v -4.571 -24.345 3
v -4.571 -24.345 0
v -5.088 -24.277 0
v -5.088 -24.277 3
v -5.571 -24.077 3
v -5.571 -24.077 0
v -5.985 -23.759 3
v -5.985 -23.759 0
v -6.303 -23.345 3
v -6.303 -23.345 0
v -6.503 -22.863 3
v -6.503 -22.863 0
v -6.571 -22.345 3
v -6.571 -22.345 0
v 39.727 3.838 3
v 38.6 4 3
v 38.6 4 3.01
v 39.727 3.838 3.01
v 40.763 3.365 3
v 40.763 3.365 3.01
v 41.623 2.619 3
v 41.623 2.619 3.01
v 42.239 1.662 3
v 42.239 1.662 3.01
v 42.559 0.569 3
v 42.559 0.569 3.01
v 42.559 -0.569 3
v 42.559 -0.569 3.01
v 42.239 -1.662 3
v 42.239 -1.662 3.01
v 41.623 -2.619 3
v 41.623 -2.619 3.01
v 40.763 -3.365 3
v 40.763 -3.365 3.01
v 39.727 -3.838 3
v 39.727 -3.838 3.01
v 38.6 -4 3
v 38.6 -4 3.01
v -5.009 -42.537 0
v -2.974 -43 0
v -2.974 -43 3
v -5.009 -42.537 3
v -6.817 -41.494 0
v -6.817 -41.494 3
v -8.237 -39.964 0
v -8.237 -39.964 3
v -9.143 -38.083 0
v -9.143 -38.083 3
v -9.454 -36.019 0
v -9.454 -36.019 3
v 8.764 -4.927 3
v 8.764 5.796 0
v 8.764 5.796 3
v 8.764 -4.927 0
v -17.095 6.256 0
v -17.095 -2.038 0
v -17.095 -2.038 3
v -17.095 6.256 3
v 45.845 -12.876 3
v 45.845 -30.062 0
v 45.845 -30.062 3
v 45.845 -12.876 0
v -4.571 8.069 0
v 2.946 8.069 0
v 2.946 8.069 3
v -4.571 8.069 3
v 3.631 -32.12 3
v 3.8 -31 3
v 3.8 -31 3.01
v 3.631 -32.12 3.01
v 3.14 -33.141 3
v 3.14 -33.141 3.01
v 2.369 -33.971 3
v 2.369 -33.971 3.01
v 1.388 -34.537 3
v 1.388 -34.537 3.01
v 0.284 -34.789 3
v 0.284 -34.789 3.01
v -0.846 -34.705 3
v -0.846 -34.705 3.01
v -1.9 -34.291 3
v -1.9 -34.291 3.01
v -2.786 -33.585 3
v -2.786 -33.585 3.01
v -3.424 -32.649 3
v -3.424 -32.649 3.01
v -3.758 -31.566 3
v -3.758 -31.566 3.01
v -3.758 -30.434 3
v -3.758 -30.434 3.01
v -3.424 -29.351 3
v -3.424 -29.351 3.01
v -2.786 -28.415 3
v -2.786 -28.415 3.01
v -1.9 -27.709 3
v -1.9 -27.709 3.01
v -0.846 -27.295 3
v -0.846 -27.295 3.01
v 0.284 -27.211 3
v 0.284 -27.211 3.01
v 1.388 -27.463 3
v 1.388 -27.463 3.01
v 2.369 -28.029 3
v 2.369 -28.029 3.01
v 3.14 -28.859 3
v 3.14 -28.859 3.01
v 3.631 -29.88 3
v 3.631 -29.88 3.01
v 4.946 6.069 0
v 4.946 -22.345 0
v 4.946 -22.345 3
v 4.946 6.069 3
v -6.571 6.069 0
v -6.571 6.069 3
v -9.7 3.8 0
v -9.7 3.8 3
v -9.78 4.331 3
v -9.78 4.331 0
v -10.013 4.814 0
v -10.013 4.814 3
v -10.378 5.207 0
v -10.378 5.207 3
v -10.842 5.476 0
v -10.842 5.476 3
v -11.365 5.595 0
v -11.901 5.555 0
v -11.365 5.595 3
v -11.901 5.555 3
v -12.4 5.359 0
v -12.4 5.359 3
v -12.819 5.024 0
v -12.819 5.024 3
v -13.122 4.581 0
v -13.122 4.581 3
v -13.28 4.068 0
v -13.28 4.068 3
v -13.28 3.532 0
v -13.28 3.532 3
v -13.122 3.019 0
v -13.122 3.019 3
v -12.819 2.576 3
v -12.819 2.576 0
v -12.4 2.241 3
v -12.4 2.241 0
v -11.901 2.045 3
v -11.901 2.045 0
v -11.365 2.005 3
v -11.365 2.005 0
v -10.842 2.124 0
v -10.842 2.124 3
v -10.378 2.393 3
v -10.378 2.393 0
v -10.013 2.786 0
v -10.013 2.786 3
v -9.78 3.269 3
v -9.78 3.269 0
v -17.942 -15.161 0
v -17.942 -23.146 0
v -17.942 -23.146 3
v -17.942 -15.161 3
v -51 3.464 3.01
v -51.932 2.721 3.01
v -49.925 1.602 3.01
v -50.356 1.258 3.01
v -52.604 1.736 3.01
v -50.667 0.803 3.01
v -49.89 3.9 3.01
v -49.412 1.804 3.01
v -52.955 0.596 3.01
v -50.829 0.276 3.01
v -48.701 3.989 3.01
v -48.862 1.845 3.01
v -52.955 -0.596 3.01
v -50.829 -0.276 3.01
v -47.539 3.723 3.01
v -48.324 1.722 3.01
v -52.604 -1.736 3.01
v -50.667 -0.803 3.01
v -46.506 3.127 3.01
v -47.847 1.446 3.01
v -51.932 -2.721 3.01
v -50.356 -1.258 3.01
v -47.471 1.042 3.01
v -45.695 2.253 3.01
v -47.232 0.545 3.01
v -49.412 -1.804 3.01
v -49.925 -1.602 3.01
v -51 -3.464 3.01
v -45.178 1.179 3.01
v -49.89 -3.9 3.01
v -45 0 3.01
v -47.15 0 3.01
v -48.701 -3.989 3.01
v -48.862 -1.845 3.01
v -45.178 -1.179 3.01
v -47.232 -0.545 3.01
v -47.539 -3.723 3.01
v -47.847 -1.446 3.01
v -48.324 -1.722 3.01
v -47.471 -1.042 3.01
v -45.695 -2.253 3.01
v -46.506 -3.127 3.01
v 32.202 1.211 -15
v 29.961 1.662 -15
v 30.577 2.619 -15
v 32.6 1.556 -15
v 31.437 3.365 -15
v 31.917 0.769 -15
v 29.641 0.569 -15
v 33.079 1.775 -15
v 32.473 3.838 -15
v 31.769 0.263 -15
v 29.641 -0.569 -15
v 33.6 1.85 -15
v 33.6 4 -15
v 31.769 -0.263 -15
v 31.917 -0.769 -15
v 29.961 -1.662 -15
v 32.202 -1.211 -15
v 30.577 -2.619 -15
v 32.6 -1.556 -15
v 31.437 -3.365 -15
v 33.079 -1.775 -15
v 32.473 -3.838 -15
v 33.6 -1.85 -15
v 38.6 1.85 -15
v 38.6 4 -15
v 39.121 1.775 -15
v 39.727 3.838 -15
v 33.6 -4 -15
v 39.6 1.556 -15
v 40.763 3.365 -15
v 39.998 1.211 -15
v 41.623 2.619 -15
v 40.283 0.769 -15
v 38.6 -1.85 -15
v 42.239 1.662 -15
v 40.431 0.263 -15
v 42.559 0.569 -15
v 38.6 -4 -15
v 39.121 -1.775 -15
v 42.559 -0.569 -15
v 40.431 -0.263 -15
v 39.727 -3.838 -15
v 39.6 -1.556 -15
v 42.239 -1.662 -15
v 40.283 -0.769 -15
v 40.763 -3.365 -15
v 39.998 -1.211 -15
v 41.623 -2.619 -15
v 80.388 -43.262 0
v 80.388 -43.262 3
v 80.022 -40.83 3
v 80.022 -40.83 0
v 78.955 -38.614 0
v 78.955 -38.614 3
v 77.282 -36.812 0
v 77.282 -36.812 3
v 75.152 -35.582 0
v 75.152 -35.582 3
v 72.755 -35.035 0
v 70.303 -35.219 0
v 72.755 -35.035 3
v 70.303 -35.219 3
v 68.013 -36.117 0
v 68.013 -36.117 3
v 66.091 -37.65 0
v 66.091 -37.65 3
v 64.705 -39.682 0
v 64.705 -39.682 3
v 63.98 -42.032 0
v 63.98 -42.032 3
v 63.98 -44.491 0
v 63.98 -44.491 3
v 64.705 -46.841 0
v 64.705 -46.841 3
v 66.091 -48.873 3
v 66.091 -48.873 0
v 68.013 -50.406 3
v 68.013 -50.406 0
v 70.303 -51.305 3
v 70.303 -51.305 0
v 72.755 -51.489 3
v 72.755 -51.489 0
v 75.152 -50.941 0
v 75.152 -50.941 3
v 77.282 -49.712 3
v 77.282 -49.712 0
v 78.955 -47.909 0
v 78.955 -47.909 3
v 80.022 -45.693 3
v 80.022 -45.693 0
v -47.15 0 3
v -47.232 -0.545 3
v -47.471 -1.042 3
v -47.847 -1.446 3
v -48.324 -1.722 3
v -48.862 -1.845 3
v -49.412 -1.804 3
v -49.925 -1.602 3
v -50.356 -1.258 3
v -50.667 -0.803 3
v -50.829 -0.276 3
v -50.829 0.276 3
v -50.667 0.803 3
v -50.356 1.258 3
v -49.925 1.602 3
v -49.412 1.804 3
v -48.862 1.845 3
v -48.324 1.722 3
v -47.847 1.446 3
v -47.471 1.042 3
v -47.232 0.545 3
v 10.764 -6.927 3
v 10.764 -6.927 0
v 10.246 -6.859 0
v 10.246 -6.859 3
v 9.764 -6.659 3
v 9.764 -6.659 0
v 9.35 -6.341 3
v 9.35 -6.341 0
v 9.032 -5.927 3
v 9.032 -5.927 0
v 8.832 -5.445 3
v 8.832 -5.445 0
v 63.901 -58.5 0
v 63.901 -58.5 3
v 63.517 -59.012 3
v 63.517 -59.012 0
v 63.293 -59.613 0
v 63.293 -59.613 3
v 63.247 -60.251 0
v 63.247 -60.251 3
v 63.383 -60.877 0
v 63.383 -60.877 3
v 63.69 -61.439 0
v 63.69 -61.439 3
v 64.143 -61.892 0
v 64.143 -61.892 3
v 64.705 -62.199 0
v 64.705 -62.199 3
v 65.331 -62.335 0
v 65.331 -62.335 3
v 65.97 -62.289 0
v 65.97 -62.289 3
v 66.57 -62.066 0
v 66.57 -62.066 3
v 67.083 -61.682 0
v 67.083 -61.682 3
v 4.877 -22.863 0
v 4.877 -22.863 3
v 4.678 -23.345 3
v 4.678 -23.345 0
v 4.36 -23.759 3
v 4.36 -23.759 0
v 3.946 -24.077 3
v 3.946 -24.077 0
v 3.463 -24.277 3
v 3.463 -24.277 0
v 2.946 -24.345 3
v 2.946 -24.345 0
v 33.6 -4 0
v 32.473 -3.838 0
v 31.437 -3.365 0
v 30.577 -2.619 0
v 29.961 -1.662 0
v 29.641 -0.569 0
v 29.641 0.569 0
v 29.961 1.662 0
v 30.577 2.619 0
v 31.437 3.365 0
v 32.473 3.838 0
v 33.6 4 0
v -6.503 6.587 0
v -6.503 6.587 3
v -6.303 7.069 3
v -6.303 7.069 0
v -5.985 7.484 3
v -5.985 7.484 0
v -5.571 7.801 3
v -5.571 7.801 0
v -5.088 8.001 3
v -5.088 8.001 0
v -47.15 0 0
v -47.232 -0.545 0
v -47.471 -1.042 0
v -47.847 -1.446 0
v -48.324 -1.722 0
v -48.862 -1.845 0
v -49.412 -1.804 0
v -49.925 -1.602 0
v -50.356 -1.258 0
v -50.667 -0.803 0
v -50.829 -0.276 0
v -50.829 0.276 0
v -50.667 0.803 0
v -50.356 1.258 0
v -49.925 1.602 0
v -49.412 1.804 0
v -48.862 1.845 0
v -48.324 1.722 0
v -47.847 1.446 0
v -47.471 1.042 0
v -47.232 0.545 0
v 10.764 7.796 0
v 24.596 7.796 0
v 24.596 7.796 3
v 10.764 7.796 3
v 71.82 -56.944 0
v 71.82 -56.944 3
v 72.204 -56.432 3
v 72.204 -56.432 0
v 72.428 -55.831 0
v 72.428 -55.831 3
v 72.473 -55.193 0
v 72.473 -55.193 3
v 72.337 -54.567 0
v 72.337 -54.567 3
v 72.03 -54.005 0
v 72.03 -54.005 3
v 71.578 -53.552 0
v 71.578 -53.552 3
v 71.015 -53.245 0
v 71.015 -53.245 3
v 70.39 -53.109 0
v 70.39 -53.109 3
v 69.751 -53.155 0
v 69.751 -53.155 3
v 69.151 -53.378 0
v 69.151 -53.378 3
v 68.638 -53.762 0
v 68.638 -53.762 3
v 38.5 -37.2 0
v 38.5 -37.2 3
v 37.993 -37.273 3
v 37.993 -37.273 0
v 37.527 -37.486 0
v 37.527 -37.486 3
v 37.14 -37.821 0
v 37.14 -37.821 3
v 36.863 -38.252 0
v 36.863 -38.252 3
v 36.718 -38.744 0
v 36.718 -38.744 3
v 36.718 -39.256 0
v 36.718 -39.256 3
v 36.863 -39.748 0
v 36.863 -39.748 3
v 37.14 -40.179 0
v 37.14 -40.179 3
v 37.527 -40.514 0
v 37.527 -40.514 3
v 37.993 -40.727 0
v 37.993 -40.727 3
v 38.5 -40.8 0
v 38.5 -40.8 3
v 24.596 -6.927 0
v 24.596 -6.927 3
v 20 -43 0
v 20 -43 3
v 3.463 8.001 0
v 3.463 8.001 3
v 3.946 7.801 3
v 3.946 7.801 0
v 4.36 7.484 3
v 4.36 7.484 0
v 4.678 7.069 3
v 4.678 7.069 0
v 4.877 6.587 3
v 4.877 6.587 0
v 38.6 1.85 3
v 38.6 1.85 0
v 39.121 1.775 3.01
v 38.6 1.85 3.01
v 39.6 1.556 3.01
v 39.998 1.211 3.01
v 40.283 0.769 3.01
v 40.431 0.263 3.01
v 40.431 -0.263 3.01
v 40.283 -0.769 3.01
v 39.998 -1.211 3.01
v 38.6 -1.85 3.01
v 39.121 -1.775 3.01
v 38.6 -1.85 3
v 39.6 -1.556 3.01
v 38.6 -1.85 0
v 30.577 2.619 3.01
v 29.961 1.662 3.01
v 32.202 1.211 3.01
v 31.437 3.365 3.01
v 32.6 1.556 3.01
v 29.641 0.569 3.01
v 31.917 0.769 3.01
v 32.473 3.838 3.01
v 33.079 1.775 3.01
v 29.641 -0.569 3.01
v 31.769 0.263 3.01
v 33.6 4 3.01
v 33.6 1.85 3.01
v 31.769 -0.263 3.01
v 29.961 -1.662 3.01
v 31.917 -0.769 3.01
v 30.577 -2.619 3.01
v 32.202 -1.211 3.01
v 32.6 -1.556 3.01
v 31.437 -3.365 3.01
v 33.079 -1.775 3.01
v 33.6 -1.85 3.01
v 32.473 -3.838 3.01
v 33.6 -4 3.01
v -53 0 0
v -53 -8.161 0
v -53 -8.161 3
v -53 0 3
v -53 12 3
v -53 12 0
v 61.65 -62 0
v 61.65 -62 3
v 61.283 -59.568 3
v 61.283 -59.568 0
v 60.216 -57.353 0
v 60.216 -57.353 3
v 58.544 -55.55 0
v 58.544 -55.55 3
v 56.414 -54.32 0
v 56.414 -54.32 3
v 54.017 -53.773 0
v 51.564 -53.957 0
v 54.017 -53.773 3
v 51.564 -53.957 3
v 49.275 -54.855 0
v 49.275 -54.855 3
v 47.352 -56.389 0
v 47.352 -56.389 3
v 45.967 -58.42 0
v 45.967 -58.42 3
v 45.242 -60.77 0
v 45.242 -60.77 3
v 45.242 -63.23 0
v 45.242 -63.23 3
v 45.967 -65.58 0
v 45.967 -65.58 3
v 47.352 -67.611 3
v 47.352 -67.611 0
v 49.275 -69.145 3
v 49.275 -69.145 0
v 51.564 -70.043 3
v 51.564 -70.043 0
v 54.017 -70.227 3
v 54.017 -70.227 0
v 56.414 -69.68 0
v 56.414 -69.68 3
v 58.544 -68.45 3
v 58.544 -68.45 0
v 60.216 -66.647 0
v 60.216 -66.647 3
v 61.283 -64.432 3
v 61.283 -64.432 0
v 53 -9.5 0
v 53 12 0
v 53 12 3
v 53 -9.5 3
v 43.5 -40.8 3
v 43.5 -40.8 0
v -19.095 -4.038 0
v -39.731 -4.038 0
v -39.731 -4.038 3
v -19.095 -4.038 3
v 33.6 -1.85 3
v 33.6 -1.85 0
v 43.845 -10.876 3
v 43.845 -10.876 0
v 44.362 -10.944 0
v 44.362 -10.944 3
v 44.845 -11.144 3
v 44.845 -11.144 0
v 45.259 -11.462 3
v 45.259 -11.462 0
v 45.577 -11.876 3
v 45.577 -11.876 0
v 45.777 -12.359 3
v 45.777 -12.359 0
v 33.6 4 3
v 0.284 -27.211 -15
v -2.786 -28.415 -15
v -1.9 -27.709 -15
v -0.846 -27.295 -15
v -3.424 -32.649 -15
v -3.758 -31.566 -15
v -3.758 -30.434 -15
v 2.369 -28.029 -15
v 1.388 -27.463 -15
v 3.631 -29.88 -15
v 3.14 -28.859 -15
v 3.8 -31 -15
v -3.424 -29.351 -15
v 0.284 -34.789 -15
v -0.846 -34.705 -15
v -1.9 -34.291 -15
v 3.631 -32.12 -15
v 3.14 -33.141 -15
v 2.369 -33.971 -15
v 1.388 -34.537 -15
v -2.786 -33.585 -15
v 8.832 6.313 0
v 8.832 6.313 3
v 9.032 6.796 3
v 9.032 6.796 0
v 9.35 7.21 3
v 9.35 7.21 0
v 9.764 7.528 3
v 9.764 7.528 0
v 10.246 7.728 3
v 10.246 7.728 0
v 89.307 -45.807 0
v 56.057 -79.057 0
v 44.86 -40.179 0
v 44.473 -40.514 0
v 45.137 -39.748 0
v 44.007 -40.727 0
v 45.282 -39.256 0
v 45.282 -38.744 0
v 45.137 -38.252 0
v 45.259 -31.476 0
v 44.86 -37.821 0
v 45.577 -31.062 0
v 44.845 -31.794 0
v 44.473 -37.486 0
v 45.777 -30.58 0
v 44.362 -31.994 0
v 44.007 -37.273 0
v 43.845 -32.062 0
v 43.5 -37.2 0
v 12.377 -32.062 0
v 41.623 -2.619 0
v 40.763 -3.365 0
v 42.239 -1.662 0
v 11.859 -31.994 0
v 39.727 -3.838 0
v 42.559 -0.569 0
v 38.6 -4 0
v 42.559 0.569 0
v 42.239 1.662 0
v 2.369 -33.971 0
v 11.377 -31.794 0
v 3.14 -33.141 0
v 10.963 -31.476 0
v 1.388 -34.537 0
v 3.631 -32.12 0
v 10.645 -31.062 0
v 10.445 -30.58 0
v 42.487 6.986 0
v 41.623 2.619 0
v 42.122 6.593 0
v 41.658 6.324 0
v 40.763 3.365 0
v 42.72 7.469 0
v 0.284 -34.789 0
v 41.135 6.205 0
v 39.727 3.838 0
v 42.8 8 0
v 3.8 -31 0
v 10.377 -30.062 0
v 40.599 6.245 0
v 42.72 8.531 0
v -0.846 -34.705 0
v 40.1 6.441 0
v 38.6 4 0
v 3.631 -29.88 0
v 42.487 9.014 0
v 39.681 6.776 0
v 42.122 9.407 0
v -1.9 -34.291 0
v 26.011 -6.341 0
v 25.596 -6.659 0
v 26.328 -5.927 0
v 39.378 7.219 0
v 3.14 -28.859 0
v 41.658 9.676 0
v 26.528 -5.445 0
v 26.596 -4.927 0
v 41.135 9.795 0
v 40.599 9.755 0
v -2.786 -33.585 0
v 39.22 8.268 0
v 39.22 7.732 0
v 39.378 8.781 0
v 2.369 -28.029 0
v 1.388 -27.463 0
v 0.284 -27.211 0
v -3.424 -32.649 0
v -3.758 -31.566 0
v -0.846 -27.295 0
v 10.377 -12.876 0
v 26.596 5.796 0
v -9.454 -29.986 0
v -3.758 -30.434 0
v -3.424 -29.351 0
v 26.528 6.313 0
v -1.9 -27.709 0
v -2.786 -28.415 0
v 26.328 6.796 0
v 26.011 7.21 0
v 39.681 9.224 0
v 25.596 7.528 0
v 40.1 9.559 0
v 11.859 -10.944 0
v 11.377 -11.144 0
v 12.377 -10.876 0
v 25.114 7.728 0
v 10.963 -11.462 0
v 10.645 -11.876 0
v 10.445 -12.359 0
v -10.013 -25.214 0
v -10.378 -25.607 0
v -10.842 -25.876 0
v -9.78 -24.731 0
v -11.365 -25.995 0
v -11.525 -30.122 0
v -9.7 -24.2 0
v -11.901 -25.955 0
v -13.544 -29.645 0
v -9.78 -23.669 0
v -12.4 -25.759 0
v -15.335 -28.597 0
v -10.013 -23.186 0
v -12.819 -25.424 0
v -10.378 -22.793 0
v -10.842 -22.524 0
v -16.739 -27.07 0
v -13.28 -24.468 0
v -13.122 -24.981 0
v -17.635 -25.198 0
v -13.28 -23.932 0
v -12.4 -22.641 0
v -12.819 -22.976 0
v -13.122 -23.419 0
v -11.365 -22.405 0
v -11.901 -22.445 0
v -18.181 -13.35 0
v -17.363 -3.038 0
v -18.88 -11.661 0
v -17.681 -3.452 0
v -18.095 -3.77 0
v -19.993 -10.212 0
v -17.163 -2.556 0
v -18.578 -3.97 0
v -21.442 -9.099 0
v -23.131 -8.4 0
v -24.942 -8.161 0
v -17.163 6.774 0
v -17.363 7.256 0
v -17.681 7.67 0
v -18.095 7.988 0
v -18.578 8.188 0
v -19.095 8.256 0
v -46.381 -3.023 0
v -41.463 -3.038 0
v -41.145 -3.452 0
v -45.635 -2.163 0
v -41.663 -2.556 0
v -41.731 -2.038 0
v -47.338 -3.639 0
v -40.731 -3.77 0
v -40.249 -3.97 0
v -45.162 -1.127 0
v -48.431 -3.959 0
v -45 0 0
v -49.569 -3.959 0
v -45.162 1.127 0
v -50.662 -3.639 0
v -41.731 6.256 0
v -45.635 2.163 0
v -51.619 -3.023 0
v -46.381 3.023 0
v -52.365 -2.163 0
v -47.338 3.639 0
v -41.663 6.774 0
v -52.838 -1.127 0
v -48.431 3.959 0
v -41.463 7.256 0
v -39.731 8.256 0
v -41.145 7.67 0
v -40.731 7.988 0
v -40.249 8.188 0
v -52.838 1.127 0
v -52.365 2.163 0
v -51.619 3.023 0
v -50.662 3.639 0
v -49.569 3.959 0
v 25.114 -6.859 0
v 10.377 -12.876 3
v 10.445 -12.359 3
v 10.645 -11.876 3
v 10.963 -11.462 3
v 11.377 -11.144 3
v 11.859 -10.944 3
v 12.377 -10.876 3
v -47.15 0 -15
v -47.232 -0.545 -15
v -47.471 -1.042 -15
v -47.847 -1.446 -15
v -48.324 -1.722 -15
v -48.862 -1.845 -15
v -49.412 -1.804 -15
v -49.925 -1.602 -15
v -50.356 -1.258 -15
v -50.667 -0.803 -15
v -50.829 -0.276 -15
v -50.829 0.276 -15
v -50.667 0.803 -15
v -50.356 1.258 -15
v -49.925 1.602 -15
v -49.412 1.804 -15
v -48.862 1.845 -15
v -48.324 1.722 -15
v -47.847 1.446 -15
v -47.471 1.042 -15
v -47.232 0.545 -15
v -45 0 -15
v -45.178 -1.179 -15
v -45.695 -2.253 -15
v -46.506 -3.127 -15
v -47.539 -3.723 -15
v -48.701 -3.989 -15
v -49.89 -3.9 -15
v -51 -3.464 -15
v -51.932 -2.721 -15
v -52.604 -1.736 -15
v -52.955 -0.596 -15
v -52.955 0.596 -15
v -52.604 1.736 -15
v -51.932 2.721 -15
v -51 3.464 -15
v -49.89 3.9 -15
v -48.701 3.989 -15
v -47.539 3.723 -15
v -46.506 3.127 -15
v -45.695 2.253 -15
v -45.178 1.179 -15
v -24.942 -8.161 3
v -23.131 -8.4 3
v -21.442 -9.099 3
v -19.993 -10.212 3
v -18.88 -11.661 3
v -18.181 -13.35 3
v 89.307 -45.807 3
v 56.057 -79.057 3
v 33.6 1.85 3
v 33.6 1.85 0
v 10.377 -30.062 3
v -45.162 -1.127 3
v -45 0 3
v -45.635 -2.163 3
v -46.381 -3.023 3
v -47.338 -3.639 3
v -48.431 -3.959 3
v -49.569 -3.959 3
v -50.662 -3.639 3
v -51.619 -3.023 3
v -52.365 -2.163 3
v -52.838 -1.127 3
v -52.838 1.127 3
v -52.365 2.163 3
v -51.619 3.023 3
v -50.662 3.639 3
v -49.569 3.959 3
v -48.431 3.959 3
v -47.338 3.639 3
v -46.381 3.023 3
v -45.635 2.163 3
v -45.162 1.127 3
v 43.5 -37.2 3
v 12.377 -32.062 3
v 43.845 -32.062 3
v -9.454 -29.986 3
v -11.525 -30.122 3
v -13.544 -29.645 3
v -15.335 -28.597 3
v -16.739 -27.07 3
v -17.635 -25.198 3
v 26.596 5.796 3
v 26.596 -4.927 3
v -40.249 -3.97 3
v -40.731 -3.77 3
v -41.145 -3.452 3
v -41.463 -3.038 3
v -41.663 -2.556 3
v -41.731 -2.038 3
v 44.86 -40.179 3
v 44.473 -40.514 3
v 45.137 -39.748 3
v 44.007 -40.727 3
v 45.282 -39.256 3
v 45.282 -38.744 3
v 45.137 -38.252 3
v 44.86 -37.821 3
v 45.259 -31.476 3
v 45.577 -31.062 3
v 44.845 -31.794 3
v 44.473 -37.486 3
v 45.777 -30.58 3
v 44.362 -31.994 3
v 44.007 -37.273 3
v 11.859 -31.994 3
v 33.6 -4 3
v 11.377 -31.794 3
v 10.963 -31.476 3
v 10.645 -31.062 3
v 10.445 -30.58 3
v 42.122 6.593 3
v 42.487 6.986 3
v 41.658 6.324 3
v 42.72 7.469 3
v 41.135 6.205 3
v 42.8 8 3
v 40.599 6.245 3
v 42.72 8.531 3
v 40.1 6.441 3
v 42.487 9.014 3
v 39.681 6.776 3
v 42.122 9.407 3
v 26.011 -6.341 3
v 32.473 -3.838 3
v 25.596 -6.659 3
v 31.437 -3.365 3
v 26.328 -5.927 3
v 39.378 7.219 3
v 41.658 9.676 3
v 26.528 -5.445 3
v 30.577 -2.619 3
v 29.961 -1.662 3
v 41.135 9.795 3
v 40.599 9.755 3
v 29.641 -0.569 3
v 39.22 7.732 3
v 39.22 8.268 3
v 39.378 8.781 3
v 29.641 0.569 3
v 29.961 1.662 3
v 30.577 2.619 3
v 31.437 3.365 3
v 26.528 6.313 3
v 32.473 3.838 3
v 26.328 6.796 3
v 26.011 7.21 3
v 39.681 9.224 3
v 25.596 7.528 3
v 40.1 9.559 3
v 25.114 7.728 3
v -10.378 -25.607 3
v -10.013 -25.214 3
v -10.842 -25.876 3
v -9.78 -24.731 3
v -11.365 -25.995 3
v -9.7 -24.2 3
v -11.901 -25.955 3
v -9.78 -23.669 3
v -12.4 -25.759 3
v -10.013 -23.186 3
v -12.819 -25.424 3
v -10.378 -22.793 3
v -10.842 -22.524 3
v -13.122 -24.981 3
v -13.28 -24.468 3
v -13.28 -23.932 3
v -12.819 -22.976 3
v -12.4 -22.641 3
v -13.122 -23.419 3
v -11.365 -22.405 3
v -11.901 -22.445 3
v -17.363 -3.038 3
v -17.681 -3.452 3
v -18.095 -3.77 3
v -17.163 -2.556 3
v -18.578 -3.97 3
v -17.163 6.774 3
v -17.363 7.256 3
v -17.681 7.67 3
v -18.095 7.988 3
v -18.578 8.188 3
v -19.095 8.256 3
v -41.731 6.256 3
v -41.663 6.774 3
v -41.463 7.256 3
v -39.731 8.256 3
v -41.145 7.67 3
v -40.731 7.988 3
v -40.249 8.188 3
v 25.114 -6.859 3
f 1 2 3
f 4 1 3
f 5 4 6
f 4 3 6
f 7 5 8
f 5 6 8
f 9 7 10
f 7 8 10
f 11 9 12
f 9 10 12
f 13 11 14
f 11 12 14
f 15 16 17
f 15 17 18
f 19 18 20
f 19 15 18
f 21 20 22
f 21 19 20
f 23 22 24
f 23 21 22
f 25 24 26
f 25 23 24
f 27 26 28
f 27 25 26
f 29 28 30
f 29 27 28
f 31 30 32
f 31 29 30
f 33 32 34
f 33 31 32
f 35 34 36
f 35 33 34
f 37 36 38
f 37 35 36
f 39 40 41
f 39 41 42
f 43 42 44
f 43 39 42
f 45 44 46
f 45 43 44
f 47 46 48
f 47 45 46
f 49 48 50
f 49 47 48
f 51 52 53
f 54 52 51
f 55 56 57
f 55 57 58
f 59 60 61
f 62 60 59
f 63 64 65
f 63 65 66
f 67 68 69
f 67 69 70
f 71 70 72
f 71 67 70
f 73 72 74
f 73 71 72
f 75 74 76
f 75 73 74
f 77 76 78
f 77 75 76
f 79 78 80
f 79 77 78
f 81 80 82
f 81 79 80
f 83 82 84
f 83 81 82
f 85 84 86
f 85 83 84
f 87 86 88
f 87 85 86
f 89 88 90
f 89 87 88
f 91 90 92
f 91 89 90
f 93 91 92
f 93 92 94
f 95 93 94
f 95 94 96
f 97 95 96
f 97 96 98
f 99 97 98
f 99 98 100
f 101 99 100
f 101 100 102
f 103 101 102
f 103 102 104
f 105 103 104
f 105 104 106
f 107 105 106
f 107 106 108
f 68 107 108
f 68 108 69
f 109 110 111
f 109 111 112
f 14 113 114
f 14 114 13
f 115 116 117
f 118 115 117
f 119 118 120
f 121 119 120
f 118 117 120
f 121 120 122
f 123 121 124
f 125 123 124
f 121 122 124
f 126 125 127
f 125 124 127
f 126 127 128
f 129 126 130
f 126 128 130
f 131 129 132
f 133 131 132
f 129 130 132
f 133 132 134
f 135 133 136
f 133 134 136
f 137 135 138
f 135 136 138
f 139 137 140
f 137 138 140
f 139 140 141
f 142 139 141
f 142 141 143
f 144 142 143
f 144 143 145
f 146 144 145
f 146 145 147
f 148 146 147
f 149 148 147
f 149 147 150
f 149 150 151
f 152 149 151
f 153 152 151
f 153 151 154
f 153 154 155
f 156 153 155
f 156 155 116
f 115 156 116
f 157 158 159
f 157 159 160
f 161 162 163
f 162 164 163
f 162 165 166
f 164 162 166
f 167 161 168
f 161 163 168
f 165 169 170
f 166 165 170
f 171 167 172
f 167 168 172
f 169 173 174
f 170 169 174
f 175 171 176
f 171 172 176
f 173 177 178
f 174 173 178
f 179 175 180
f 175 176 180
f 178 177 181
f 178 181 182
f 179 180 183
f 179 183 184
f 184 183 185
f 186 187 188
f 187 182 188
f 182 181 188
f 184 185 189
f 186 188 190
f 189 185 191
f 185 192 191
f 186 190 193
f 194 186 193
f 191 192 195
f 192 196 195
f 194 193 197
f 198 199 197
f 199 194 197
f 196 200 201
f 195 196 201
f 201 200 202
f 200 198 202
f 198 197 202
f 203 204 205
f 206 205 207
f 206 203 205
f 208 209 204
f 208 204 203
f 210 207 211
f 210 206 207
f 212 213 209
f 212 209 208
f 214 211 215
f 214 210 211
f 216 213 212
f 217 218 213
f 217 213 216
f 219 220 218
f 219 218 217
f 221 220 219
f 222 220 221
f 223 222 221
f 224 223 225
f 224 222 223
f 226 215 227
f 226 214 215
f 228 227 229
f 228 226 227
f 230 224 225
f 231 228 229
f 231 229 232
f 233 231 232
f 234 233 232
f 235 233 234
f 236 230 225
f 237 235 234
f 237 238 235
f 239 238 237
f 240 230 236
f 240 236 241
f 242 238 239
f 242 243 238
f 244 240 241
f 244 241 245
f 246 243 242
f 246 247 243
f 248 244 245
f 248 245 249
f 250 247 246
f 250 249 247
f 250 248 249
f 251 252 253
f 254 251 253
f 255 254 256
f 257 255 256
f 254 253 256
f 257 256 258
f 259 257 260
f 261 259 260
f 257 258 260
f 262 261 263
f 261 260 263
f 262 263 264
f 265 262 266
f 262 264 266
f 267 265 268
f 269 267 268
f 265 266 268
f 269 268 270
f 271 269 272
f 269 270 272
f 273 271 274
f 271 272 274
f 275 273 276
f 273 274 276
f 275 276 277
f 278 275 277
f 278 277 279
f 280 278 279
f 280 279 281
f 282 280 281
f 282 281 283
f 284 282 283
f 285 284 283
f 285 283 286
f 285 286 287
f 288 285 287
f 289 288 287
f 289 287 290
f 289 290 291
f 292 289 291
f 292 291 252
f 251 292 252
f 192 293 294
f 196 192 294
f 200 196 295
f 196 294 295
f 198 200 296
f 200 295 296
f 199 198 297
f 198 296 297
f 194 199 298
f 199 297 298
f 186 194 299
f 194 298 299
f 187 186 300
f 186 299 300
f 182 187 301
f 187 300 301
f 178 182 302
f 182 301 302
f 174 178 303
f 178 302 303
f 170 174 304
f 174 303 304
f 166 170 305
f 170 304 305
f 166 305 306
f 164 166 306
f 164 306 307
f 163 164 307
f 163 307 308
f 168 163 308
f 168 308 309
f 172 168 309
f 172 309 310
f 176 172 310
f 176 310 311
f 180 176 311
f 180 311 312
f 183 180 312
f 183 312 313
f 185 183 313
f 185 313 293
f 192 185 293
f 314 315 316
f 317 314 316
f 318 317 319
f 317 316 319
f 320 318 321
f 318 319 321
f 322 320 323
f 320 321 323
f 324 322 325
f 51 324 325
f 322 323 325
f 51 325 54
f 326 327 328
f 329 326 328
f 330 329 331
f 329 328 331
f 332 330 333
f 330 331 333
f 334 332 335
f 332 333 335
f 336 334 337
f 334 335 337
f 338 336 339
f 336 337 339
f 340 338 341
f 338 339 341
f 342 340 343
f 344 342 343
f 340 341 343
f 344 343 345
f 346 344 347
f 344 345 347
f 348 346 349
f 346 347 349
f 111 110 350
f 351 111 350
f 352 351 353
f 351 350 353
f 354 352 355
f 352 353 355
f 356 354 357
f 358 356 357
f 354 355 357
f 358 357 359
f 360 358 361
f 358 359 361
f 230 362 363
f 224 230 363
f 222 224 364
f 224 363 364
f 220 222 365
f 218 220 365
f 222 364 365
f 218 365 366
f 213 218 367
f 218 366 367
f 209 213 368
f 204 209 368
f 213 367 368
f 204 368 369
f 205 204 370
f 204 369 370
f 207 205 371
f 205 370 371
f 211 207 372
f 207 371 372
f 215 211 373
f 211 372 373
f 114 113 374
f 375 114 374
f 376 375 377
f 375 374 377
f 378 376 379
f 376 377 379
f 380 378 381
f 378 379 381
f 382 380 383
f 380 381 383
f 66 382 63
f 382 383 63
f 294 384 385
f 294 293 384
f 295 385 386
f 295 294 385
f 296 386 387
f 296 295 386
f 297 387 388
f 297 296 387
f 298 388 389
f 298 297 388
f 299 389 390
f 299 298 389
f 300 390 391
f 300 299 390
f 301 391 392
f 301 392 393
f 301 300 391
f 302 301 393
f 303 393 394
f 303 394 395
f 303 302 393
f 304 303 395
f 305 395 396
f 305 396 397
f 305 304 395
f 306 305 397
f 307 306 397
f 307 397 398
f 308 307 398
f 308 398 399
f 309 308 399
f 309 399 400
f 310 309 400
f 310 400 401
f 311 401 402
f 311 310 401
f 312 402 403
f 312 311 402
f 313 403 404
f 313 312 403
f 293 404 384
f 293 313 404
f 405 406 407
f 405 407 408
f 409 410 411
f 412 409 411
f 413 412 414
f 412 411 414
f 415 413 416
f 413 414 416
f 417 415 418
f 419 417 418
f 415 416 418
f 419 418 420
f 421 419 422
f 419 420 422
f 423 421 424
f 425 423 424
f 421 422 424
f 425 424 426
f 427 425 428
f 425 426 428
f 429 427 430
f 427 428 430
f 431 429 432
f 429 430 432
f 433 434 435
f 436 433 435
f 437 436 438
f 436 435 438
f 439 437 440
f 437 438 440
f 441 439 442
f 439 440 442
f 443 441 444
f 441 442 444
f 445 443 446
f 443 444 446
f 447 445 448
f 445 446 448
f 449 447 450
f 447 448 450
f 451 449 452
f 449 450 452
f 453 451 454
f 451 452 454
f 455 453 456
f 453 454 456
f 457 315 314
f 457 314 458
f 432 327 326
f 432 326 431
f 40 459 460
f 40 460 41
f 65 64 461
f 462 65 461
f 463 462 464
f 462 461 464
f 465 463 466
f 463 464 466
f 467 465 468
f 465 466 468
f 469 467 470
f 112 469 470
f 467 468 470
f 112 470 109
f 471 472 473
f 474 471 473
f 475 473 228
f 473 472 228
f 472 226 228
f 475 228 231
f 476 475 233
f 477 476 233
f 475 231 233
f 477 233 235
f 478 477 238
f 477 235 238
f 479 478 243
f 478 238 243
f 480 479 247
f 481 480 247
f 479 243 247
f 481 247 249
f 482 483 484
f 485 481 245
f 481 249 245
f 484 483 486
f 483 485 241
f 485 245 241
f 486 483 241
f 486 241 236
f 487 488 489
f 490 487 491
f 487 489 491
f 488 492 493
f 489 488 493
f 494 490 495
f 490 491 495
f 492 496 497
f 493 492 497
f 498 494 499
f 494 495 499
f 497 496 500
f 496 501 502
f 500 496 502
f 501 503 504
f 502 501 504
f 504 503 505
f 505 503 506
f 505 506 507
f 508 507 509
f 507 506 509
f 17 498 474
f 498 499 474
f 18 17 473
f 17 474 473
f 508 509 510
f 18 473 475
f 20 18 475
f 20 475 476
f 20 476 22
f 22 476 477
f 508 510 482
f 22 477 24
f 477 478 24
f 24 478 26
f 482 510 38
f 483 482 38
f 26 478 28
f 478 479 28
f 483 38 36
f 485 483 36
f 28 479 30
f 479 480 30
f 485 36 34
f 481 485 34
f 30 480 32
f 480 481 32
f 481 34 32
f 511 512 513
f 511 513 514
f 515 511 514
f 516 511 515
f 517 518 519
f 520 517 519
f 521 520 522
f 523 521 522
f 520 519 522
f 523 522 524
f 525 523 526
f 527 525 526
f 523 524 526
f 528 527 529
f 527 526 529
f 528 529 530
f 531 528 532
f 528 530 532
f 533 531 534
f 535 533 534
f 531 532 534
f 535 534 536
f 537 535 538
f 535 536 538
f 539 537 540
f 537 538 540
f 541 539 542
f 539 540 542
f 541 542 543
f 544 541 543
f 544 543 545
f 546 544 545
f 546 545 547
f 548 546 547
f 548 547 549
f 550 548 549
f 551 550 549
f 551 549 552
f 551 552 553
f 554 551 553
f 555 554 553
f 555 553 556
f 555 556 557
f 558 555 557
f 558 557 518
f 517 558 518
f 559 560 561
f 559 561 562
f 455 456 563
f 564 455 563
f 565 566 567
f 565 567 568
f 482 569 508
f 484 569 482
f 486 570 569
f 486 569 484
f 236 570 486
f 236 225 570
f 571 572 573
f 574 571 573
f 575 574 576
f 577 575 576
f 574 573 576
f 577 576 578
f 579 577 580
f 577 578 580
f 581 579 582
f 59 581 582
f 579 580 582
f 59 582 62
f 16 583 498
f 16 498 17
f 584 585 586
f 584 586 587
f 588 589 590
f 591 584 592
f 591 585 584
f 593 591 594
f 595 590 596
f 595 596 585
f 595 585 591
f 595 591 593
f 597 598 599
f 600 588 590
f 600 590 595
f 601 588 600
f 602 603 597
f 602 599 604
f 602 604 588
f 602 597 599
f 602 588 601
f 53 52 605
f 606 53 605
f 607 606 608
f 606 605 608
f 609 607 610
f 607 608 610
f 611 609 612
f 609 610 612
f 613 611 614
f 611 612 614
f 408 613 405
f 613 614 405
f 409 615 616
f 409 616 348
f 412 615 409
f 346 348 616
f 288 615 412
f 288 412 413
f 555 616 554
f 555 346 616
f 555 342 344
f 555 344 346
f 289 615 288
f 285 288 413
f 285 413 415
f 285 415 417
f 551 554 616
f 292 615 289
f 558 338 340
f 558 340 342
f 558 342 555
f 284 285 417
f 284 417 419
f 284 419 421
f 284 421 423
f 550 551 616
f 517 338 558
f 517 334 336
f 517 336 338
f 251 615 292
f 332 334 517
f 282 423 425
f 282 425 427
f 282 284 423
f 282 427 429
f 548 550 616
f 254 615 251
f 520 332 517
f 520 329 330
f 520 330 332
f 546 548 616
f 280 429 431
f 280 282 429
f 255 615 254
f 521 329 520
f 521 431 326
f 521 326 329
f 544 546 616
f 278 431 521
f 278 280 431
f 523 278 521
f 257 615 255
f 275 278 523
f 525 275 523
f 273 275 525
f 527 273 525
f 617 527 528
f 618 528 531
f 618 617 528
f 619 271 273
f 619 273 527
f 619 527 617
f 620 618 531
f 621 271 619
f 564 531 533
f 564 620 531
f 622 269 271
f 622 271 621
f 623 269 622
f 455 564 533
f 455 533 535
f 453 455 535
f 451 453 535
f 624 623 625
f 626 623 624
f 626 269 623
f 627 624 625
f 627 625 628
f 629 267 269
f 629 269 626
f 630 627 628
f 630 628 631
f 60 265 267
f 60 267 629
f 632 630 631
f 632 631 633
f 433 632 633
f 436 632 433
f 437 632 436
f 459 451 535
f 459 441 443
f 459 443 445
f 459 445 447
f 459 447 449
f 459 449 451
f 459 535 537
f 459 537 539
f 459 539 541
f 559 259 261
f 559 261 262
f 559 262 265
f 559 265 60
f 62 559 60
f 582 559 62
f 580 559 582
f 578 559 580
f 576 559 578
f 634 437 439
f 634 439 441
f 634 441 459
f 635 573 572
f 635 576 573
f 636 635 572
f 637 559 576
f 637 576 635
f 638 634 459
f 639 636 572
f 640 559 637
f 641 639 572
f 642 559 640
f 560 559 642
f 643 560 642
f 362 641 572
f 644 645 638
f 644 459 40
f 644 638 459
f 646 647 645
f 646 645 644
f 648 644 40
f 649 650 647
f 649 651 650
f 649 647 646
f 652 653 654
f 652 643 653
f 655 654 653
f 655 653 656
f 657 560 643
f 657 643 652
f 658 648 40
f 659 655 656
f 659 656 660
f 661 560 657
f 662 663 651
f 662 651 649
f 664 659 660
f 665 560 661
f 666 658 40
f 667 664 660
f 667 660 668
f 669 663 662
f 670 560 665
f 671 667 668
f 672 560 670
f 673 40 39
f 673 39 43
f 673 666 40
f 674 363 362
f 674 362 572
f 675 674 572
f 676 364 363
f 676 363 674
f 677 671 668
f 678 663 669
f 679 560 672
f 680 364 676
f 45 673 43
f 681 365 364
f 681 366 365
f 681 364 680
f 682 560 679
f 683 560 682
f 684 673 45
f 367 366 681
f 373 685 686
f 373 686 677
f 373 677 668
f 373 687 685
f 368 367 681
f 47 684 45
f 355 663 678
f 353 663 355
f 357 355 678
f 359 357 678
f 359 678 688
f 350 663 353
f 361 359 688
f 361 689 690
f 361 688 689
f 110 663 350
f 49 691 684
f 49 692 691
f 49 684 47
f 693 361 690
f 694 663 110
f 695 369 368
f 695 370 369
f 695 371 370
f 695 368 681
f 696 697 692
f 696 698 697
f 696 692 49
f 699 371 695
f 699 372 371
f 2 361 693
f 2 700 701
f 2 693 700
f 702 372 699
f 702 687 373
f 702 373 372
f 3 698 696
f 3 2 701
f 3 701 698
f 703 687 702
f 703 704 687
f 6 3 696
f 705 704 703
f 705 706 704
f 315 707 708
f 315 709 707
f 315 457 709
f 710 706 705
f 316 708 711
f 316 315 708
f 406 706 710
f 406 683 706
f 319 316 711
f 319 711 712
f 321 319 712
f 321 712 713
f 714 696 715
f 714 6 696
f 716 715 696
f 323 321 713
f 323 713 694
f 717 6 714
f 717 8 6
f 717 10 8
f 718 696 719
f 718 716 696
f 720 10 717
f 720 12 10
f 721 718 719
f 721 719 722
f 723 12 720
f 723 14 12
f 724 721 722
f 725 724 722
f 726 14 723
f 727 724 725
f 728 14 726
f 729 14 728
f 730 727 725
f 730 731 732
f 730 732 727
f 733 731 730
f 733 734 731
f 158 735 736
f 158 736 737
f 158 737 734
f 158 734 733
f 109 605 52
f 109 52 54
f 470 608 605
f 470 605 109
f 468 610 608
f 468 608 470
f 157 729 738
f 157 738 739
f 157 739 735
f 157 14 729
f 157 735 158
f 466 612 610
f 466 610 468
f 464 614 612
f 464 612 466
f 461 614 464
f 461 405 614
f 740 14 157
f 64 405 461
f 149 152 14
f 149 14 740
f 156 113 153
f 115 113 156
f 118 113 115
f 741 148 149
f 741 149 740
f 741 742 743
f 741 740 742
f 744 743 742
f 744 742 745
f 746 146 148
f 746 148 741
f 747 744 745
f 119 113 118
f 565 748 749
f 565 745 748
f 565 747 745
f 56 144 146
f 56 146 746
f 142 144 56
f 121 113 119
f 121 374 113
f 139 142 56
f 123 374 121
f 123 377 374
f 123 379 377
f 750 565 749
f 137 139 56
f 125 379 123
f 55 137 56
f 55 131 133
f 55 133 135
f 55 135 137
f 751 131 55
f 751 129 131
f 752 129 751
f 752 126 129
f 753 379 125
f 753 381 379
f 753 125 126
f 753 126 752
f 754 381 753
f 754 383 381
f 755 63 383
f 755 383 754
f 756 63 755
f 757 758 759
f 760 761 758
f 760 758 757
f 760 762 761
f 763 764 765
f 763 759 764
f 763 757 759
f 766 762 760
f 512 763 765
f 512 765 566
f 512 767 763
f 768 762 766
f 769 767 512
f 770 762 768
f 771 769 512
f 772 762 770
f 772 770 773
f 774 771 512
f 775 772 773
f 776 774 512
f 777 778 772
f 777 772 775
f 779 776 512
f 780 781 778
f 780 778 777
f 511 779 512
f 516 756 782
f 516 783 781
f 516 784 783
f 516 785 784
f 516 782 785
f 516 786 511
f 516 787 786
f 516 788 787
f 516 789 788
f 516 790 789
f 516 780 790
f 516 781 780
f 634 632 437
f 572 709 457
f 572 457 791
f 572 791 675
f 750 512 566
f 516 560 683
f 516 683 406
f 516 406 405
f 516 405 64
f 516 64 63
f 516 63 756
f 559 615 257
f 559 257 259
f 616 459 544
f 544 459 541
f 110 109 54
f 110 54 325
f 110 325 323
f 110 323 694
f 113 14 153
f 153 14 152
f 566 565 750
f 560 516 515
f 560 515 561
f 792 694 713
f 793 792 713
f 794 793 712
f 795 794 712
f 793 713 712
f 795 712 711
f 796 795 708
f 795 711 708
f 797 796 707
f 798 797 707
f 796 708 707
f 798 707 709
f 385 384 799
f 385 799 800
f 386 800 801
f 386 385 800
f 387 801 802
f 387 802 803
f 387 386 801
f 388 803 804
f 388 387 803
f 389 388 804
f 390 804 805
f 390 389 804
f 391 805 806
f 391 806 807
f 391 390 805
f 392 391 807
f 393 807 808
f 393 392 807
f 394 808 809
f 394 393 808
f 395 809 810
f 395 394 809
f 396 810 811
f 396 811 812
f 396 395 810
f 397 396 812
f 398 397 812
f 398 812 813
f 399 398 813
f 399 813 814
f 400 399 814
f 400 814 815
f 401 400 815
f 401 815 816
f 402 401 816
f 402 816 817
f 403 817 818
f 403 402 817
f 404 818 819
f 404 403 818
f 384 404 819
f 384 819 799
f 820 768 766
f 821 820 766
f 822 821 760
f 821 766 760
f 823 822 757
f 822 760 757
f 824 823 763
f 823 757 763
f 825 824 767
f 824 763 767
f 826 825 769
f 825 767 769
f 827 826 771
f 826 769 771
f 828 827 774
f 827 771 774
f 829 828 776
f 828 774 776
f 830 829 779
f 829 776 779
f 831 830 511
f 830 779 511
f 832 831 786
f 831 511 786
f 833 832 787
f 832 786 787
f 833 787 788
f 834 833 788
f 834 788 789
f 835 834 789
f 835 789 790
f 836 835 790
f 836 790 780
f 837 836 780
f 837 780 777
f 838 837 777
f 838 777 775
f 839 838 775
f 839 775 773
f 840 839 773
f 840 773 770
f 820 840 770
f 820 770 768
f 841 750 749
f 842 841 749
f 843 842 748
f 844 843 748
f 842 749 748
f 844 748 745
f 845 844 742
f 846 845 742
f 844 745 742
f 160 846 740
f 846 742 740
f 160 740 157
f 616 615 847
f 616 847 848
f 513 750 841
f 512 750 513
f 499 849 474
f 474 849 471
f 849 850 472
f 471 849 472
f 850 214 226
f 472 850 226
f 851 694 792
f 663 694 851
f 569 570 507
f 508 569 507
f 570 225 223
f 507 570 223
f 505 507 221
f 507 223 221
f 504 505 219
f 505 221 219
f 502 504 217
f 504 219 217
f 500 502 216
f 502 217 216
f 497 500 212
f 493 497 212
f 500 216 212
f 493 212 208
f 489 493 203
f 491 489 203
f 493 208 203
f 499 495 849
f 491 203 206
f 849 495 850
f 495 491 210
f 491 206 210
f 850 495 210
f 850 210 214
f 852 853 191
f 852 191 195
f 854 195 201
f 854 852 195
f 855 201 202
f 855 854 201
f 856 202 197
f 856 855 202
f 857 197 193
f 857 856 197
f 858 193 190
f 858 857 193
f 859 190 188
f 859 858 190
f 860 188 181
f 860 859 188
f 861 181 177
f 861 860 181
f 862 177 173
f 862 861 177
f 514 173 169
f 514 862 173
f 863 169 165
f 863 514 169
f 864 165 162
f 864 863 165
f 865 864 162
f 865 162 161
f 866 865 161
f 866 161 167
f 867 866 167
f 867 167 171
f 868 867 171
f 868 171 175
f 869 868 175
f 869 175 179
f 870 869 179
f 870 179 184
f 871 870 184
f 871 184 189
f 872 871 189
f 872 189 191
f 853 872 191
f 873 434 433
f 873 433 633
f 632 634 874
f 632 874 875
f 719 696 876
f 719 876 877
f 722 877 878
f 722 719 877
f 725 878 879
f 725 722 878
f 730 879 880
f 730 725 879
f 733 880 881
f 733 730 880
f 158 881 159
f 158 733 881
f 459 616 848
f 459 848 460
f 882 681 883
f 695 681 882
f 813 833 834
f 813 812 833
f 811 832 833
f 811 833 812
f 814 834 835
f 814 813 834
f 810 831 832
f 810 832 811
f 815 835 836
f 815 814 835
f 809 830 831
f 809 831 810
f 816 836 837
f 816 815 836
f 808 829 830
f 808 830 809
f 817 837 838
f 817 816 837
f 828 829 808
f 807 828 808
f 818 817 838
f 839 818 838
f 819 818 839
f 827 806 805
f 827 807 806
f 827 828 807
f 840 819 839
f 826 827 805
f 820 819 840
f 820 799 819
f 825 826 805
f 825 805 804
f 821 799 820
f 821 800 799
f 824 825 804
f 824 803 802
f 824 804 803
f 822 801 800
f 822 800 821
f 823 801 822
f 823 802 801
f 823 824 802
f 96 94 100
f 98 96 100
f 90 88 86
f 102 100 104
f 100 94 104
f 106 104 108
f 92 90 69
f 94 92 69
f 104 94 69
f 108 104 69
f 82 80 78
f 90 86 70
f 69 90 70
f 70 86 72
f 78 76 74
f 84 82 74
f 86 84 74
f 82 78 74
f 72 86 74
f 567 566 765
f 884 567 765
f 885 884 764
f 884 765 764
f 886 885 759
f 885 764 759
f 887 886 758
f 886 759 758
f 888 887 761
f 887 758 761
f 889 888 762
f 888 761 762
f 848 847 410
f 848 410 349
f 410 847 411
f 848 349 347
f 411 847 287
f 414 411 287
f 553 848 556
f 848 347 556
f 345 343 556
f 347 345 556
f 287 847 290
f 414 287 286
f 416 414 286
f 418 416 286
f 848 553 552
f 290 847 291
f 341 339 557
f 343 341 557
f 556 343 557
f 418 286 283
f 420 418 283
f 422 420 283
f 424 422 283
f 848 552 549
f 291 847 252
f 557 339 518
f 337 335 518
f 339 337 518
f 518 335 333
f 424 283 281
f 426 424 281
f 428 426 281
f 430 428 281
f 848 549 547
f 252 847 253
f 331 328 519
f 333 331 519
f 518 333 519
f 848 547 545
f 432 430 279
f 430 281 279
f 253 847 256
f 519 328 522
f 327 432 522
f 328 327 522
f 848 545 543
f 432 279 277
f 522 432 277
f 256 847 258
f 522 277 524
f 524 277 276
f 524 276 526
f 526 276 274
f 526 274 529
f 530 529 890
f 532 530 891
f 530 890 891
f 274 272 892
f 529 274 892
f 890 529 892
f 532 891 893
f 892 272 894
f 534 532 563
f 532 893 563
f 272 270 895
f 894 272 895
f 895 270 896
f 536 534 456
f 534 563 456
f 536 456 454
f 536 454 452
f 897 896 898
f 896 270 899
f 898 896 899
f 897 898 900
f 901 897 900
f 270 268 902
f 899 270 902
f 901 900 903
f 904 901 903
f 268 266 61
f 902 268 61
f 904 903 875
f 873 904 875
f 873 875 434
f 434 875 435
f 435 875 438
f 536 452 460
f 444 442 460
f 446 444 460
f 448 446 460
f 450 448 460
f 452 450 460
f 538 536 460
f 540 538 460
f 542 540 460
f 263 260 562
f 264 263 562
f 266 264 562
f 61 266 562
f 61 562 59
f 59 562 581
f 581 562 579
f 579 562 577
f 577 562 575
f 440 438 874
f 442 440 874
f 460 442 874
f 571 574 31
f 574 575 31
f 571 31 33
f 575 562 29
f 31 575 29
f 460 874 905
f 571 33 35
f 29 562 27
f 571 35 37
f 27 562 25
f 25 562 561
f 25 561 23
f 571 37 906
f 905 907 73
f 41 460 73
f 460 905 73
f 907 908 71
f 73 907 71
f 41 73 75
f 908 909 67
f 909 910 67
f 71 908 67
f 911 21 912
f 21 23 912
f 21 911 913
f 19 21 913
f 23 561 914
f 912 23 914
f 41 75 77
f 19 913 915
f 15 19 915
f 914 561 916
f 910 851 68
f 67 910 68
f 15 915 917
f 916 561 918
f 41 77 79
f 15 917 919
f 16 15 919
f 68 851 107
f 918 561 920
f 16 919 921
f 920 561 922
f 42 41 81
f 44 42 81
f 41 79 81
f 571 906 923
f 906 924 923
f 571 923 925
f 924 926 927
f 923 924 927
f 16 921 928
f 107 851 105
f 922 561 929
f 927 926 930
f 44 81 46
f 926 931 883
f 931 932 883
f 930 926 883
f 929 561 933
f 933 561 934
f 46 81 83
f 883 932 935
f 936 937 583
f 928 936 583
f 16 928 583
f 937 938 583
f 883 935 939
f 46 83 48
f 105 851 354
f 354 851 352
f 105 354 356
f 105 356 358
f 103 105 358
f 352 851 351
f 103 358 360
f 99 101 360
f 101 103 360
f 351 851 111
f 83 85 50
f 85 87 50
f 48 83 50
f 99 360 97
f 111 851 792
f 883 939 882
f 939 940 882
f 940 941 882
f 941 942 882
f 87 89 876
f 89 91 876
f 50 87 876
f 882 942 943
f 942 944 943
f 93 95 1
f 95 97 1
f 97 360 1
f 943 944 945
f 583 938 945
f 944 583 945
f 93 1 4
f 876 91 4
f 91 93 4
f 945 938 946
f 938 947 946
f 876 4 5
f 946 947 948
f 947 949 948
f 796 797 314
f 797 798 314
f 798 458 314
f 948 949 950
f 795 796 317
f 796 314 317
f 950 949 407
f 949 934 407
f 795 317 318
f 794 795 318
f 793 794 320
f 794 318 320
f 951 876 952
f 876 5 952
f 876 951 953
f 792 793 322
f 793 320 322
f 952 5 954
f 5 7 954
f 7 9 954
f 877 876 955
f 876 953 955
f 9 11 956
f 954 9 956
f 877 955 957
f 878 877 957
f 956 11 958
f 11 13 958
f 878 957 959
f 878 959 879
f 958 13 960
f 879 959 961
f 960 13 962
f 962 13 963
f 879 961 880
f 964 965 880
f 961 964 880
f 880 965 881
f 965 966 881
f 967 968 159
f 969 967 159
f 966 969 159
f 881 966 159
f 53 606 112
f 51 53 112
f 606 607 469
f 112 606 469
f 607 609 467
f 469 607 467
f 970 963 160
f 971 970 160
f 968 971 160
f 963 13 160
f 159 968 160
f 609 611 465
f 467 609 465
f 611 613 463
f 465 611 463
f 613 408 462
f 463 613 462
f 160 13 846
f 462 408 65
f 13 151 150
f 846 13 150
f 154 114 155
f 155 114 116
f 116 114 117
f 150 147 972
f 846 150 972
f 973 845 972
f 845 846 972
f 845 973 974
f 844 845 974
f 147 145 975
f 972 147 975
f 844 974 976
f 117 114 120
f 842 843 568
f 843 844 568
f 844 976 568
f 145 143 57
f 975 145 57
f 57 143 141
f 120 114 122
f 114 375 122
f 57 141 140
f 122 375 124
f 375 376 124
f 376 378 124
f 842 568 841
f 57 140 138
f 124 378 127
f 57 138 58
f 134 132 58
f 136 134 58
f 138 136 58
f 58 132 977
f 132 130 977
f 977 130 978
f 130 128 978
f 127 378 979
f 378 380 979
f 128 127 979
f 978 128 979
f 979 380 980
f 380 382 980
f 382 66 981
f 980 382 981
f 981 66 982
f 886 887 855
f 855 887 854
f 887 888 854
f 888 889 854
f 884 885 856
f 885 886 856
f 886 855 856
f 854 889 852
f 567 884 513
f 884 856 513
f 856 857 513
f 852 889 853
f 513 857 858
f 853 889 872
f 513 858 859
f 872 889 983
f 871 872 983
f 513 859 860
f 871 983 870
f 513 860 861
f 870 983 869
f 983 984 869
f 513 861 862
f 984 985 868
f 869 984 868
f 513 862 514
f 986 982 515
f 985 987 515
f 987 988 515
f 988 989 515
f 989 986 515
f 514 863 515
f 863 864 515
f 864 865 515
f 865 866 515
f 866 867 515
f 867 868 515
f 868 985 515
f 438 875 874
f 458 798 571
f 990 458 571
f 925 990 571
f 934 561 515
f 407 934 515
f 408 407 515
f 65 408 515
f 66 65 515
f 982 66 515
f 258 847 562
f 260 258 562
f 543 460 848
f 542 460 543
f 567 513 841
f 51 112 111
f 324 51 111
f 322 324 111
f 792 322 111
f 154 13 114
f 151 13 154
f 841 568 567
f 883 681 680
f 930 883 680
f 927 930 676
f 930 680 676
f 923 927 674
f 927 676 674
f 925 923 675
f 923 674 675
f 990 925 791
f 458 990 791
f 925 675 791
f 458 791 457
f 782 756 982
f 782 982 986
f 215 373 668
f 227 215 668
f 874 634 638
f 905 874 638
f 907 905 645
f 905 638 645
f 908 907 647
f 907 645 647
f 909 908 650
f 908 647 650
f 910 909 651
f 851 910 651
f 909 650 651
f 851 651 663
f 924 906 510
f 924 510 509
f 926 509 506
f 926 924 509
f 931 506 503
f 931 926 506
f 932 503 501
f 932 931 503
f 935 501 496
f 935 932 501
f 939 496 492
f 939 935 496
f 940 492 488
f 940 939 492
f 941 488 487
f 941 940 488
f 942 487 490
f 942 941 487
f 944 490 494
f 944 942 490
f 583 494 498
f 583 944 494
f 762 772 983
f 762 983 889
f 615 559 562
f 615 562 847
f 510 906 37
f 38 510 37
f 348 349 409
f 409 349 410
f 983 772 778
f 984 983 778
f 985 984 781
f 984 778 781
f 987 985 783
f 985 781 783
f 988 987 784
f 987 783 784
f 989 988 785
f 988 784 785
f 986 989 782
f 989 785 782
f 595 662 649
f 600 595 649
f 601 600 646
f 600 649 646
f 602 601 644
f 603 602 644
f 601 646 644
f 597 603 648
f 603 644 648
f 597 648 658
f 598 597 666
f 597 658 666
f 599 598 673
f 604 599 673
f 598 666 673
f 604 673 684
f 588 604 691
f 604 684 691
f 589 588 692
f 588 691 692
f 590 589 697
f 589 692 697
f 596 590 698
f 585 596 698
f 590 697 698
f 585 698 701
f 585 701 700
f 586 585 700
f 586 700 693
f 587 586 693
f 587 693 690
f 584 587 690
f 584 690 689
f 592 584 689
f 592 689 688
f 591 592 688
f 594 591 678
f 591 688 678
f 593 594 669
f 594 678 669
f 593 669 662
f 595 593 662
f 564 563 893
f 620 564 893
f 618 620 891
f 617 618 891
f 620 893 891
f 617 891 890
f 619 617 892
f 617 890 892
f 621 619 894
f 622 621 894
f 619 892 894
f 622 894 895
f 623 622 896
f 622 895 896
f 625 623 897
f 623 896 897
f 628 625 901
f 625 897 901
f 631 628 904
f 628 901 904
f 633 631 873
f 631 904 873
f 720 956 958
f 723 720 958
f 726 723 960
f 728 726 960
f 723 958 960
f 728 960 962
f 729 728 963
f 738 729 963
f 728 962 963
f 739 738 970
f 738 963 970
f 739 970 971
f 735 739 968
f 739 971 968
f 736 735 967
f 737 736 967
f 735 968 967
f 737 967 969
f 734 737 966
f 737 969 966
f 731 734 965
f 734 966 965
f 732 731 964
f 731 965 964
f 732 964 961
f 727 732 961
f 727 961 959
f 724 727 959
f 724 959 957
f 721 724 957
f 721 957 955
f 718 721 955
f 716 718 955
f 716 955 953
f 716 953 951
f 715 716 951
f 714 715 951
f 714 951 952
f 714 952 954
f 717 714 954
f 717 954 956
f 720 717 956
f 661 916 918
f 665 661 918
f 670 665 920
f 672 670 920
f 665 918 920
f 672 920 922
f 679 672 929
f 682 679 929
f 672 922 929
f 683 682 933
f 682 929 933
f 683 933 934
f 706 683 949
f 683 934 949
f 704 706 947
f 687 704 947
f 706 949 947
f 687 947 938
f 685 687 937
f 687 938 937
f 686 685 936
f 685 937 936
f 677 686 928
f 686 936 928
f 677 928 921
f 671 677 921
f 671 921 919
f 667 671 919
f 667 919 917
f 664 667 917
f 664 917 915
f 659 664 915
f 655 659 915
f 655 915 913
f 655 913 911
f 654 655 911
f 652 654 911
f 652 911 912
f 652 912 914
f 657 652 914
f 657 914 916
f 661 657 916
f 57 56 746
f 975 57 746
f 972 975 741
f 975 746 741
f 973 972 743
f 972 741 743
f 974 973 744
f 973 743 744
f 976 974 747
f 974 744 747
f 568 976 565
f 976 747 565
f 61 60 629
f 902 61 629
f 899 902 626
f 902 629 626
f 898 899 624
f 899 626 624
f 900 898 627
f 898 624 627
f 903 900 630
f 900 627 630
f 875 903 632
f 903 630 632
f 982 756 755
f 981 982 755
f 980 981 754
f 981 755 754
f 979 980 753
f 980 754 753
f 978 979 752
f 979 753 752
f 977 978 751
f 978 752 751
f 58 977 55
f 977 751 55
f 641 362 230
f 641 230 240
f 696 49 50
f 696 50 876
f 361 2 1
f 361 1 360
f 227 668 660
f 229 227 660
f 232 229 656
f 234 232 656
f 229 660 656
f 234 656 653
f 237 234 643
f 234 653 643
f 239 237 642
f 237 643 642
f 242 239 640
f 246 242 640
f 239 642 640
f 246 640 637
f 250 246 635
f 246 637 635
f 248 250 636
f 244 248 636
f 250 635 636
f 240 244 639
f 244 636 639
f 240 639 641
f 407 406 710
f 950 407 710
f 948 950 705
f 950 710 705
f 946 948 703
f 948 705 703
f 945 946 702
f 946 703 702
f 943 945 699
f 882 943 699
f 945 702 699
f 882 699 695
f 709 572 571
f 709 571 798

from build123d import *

# Parameters (mm, degrees)
SKETCH_R          = 1.85
PAD_DEPTH         = 3
SKETCH002_R       = 8.25
POCKET_DEPTH      = 5
SKETCH003_R       = 1.8
POCKET001_DEPTH   = 5
SKETCH001_R       = 3.8
SKETCH001_R_2     = 4
SKETCH001_R_3     = 1.85
PAD001_DEPTH      = 15
PAD001_DEPTH_BACK = 3.01
POCKET002_DEPTH   = 5


with BuildPart() as part:
    # Sketch → Pad (new body)
    with BuildSketch(Plane.XY):
        Polygon((-53, 12), (53, 12), (53, -9.5), (89.307498, -45.807498), (56.057498, -79.057498), (20, -43), (-53, -43), align=None)
        with Locations((-49, 0)):
            Circle(SKETCH_R, mode=Mode.SUBTRACT)
        with BuildLine():
            ThreePointArc((33.6, 1.85), (31.75, 0), (33.6, -1.85))
            Line((33.6, -1.85), (38.6, -1.85))
            ThreePointArc((38.6, -1.85), (40.45, 0), (38.6, 1.85))
            Line((33.6, 1.85), (38.6, 1.85))
        make_face(mode=Mode.SUBTRACT)
    extrude(amount=PAD_DEPTH)

    # Sketch002 → Pocket (cut)
    with BuildSketch(Plane.XY.offset(3)):
        with Locations((53.4, -62)):
            Circle(SKETCH002_R)
        with Locations((72.13833, -43.26167)):
            Circle(SKETCH002_R)
        with BuildLine():
            ThreePointArc((63.900545, -58.499812), (63.900526, -61.681792), (67.082506, -61.681812))
            Line((67.082506, -61.681812), (71.820122, -56.944196))
            ThreePointArc((71.820122, -56.944196), (71.820141, -53.762216), (68.638161, -53.762196))
            Line((63.900545, -58.499812), (68.638161, -53.762196))
        make_face()
    extrude(amount=-POCKET_DEPTH, mode=Mode.SUBTRACT)

    # Sketch003 → Pocket001 (cut)
    with BuildSketch(Plane.XY.offset(3)):
        with Locations((41, 8)):
            Circle(SKETCH003_R)
        with Locations((-11.5, 3.8)):
            Circle(SKETCH003_R)
        with Locations((-11.5, -24.2)):
            Circle(SKETCH003_R)
        with BuildLine():
            ThreePointArc((38.500015, -37.2), (36.7, -38.999992), (38.5, -40.8))
            Line((38.5, -40.8), (43.5, -40.8))
            ThreePointArc((43.5, -40.8), (45.3, -39.000007), (43.500014, -37.2))
            Line((38.500015, -37.2), (43.500014, -37.2))
        make_face()
    extrude(amount=-POCKET001_DEPTH, mode=Mode.SUBTRACT)

    # Sketch001 → Pad001 (new body, two sides)
    with BuildSketch(Plane(origin=(0, 0, 0), x_dir=(1, 0, 0), z_dir=(0, 0, -1))) as pad001_sk:
        with Locations((0, 31)):
            Circle(SKETCH001_R)
        with Locations((-49, 0)):
            Circle(SKETCH001_R_2)
        with Locations((-49, 0)):
            Circle(SKETCH001_R_3, mode=Mode.SUBTRACT)
        with BuildLine():
            ThreePointArc((33.599994, 4), (29.6, 0), (33.599994, -4))
            Line((33.599994, -4), (38.599999, -4))
            ThreePointArc((38.599999, -4), (42.6, 0), (38.599999, 4))
            Line((33.599994, 4), (38.599999, 4))
        make_face()
        with BuildLine():
            ThreePointArc((33.599994, 1.85), (31.75, 0), (33.599994, -1.85))
            Line((33.599994, -1.85), (38.599987, -1.85))
            ThreePointArc((38.599987, -1.85), (40.45, 0), (38.599986, 1.85))
            Line((33.599994, 1.85), (38.599986, 1.85))
        make_face(mode=Mode.SUBTRACT)
    extrude(amount=PAD001_DEPTH)
    extrude(pad001_sk.sketch, amount=-PAD001_DEPTH_BACK)

    # Sketch005 → Pocket002 (cut)
    with BuildSketch(Plane(origin=(0, 0, 0), x_dir=(1, 0, 0), z_dir=(0, 0, -1))):
        with BuildLine():
            Line((-54.253271, 49.235991), (-17.942303, 49.235991))
            Line((-17.942303, 49.235991), (-17.942303, 43.633577))
            Line((-17.942303, 43.633577), (-9.10105, 43.633577))
            Line((-9.10105, 43.633577), (-9.10105, 45.139777))
            Line((-9.10105, 45.139777), (-1.154269, 45.139777))
            Line((-1.154269, 45.139777), (-1.154269, 43.019269))
            Line((-1.154269, 43.019269), (-2.454473, 43.019269))
            ThreePointArc((-2.454473, 43.019269), (-7.40422, 40.969016), (-9.454473, 36.019269))
            Line((-9.454473, 36.019269), (-9.454473, 29.986307))
            ThreePointArc((-9.454473, 29.986307), (-15.334637, 28.596701), (-17.942303, 23.146251))
            Line((-17.942303, 23.146251), (-17.942303, 15.161412))
            ThreePointArc((-24.942303, 8.161412), (-19.992556, 10.211665), (-17.942303, 15.161412))
            Line((-24.942303, 8.161412), (-59.799003, 8.161412))
            ThreePointArc((-65.681137, 14.043546), (-63.9583, 9.884249), (-59.799003, 8.161412))
            Line((-65.681137, 14.043546), (-65.681137, 37.808126))
            ThreePointArc((-54.253271, 49.235991), (-62.333993, 45.888847), (-65.681137, 37.808126))
        make_face()
        with BuildLine():
            Line((12.376733, 32.061868), (43.844814, 32.061868))
            ThreePointArc((45.844814, 30.061868), (45.259028, 31.476081), (43.844814, 32.061868))
            Line((45.844814, 30.061868), (45.844814, 12.876317))
            ThreePointArc((43.844814, 10.876317), (45.259028, 11.462103), (45.844814, 12.876317))
            Line((43.844814, 10.876317), (12.376733, 10.876317))
            ThreePointArc((10.376733, 12.876317), (10.96252, 11.462103), (12.376733, 10.876317))
            Line((10.376733, 12.876317), (10.376733, 30.061868))
            ThreePointArc((12.376733, 32.061868), (10.96252, 31.476081), (10.376733, 30.061868))
        make_face()
        with BuildLine():
            Line((-4.570687, 24.344919), (2.945518, 24.344919))
            ThreePointArc((4.945518, 22.344919), (4.359732, 23.759133), (2.945518, 24.344919))
            Line((4.945518, 22.344919), (4.945518, -6.0694))
            ThreePointArc((2.945518, -8.0694), (4.359732, -7.483613), (4.945518, -6.0694))
            Line((2.945518, -8.0694), (-4.570687, -8.0694))
            ThreePointArc((-6.570687, -6.0694), (-5.9849, -7.483613), (-4.570687, -8.0694))
            Line((-6.570687, -6.0694), (-6.570687, 22.344919))
            ThreePointArc((-4.570687, 24.344919), (-5.9849, 23.759133), (-6.570687, 22.344919))
        make_face()
        with BuildLine():
            Line((10.764026, 6.926982), (24.596303, 6.926982))
            ThreePointArc((26.596303, 4.926982), (26.010517, 6.341195), (24.596303, 6.926982))
            Line((26.596303, 4.926982), (26.596303, -5.795768))
            ThreePointArc((24.596303, -7.795768), (26.010517, -7.209982), (26.596303, -5.795768))
            Line((24.596303, -7.795768), (10.764026, -7.795768))
            ThreePointArc((8.764026, -5.795768), (9.349812, -7.209982), (10.764026, -7.795768))
            Line((8.764026, -5.795768), (8.764026, 4.926982))
            ThreePointArc((10.764026, 6.926982), (9.349812, 6.341195), (8.764026, 4.926982))
        make_face()
        with BuildLine():
            Line((-39.731076, 4.038284), (-19.095187, 4.038284))
            ThreePointArc((-17.095187, 2.038284), (-17.680973, 3.452498), (-19.095187, 4.038284))
            Line((-17.095187, 2.038284), (-17.095187, -6.255927))
            ThreePointArc((-19.095187, -8.255927), (-17.680973, -7.67014), (-17.095187, -6.255927))
            Line((-19.095187, -8.255927), (-39.731076, -8.255927))
            ThreePointArc((-41.731076, -6.255927), (-41.145289, -7.67014), (-39.731076, -8.255927))
            Line((-41.731076, -6.255927), (-41.731076, 2.038284))
            ThreePointArc((-39.731076, 4.038284), (-41.145289, 3.452498), (-41.731076, 2.038284))
        make_face()
    extrude(amount=-POCKET002_DEPTH, mode=Mode.SUBTRACT)


solid = part.part
